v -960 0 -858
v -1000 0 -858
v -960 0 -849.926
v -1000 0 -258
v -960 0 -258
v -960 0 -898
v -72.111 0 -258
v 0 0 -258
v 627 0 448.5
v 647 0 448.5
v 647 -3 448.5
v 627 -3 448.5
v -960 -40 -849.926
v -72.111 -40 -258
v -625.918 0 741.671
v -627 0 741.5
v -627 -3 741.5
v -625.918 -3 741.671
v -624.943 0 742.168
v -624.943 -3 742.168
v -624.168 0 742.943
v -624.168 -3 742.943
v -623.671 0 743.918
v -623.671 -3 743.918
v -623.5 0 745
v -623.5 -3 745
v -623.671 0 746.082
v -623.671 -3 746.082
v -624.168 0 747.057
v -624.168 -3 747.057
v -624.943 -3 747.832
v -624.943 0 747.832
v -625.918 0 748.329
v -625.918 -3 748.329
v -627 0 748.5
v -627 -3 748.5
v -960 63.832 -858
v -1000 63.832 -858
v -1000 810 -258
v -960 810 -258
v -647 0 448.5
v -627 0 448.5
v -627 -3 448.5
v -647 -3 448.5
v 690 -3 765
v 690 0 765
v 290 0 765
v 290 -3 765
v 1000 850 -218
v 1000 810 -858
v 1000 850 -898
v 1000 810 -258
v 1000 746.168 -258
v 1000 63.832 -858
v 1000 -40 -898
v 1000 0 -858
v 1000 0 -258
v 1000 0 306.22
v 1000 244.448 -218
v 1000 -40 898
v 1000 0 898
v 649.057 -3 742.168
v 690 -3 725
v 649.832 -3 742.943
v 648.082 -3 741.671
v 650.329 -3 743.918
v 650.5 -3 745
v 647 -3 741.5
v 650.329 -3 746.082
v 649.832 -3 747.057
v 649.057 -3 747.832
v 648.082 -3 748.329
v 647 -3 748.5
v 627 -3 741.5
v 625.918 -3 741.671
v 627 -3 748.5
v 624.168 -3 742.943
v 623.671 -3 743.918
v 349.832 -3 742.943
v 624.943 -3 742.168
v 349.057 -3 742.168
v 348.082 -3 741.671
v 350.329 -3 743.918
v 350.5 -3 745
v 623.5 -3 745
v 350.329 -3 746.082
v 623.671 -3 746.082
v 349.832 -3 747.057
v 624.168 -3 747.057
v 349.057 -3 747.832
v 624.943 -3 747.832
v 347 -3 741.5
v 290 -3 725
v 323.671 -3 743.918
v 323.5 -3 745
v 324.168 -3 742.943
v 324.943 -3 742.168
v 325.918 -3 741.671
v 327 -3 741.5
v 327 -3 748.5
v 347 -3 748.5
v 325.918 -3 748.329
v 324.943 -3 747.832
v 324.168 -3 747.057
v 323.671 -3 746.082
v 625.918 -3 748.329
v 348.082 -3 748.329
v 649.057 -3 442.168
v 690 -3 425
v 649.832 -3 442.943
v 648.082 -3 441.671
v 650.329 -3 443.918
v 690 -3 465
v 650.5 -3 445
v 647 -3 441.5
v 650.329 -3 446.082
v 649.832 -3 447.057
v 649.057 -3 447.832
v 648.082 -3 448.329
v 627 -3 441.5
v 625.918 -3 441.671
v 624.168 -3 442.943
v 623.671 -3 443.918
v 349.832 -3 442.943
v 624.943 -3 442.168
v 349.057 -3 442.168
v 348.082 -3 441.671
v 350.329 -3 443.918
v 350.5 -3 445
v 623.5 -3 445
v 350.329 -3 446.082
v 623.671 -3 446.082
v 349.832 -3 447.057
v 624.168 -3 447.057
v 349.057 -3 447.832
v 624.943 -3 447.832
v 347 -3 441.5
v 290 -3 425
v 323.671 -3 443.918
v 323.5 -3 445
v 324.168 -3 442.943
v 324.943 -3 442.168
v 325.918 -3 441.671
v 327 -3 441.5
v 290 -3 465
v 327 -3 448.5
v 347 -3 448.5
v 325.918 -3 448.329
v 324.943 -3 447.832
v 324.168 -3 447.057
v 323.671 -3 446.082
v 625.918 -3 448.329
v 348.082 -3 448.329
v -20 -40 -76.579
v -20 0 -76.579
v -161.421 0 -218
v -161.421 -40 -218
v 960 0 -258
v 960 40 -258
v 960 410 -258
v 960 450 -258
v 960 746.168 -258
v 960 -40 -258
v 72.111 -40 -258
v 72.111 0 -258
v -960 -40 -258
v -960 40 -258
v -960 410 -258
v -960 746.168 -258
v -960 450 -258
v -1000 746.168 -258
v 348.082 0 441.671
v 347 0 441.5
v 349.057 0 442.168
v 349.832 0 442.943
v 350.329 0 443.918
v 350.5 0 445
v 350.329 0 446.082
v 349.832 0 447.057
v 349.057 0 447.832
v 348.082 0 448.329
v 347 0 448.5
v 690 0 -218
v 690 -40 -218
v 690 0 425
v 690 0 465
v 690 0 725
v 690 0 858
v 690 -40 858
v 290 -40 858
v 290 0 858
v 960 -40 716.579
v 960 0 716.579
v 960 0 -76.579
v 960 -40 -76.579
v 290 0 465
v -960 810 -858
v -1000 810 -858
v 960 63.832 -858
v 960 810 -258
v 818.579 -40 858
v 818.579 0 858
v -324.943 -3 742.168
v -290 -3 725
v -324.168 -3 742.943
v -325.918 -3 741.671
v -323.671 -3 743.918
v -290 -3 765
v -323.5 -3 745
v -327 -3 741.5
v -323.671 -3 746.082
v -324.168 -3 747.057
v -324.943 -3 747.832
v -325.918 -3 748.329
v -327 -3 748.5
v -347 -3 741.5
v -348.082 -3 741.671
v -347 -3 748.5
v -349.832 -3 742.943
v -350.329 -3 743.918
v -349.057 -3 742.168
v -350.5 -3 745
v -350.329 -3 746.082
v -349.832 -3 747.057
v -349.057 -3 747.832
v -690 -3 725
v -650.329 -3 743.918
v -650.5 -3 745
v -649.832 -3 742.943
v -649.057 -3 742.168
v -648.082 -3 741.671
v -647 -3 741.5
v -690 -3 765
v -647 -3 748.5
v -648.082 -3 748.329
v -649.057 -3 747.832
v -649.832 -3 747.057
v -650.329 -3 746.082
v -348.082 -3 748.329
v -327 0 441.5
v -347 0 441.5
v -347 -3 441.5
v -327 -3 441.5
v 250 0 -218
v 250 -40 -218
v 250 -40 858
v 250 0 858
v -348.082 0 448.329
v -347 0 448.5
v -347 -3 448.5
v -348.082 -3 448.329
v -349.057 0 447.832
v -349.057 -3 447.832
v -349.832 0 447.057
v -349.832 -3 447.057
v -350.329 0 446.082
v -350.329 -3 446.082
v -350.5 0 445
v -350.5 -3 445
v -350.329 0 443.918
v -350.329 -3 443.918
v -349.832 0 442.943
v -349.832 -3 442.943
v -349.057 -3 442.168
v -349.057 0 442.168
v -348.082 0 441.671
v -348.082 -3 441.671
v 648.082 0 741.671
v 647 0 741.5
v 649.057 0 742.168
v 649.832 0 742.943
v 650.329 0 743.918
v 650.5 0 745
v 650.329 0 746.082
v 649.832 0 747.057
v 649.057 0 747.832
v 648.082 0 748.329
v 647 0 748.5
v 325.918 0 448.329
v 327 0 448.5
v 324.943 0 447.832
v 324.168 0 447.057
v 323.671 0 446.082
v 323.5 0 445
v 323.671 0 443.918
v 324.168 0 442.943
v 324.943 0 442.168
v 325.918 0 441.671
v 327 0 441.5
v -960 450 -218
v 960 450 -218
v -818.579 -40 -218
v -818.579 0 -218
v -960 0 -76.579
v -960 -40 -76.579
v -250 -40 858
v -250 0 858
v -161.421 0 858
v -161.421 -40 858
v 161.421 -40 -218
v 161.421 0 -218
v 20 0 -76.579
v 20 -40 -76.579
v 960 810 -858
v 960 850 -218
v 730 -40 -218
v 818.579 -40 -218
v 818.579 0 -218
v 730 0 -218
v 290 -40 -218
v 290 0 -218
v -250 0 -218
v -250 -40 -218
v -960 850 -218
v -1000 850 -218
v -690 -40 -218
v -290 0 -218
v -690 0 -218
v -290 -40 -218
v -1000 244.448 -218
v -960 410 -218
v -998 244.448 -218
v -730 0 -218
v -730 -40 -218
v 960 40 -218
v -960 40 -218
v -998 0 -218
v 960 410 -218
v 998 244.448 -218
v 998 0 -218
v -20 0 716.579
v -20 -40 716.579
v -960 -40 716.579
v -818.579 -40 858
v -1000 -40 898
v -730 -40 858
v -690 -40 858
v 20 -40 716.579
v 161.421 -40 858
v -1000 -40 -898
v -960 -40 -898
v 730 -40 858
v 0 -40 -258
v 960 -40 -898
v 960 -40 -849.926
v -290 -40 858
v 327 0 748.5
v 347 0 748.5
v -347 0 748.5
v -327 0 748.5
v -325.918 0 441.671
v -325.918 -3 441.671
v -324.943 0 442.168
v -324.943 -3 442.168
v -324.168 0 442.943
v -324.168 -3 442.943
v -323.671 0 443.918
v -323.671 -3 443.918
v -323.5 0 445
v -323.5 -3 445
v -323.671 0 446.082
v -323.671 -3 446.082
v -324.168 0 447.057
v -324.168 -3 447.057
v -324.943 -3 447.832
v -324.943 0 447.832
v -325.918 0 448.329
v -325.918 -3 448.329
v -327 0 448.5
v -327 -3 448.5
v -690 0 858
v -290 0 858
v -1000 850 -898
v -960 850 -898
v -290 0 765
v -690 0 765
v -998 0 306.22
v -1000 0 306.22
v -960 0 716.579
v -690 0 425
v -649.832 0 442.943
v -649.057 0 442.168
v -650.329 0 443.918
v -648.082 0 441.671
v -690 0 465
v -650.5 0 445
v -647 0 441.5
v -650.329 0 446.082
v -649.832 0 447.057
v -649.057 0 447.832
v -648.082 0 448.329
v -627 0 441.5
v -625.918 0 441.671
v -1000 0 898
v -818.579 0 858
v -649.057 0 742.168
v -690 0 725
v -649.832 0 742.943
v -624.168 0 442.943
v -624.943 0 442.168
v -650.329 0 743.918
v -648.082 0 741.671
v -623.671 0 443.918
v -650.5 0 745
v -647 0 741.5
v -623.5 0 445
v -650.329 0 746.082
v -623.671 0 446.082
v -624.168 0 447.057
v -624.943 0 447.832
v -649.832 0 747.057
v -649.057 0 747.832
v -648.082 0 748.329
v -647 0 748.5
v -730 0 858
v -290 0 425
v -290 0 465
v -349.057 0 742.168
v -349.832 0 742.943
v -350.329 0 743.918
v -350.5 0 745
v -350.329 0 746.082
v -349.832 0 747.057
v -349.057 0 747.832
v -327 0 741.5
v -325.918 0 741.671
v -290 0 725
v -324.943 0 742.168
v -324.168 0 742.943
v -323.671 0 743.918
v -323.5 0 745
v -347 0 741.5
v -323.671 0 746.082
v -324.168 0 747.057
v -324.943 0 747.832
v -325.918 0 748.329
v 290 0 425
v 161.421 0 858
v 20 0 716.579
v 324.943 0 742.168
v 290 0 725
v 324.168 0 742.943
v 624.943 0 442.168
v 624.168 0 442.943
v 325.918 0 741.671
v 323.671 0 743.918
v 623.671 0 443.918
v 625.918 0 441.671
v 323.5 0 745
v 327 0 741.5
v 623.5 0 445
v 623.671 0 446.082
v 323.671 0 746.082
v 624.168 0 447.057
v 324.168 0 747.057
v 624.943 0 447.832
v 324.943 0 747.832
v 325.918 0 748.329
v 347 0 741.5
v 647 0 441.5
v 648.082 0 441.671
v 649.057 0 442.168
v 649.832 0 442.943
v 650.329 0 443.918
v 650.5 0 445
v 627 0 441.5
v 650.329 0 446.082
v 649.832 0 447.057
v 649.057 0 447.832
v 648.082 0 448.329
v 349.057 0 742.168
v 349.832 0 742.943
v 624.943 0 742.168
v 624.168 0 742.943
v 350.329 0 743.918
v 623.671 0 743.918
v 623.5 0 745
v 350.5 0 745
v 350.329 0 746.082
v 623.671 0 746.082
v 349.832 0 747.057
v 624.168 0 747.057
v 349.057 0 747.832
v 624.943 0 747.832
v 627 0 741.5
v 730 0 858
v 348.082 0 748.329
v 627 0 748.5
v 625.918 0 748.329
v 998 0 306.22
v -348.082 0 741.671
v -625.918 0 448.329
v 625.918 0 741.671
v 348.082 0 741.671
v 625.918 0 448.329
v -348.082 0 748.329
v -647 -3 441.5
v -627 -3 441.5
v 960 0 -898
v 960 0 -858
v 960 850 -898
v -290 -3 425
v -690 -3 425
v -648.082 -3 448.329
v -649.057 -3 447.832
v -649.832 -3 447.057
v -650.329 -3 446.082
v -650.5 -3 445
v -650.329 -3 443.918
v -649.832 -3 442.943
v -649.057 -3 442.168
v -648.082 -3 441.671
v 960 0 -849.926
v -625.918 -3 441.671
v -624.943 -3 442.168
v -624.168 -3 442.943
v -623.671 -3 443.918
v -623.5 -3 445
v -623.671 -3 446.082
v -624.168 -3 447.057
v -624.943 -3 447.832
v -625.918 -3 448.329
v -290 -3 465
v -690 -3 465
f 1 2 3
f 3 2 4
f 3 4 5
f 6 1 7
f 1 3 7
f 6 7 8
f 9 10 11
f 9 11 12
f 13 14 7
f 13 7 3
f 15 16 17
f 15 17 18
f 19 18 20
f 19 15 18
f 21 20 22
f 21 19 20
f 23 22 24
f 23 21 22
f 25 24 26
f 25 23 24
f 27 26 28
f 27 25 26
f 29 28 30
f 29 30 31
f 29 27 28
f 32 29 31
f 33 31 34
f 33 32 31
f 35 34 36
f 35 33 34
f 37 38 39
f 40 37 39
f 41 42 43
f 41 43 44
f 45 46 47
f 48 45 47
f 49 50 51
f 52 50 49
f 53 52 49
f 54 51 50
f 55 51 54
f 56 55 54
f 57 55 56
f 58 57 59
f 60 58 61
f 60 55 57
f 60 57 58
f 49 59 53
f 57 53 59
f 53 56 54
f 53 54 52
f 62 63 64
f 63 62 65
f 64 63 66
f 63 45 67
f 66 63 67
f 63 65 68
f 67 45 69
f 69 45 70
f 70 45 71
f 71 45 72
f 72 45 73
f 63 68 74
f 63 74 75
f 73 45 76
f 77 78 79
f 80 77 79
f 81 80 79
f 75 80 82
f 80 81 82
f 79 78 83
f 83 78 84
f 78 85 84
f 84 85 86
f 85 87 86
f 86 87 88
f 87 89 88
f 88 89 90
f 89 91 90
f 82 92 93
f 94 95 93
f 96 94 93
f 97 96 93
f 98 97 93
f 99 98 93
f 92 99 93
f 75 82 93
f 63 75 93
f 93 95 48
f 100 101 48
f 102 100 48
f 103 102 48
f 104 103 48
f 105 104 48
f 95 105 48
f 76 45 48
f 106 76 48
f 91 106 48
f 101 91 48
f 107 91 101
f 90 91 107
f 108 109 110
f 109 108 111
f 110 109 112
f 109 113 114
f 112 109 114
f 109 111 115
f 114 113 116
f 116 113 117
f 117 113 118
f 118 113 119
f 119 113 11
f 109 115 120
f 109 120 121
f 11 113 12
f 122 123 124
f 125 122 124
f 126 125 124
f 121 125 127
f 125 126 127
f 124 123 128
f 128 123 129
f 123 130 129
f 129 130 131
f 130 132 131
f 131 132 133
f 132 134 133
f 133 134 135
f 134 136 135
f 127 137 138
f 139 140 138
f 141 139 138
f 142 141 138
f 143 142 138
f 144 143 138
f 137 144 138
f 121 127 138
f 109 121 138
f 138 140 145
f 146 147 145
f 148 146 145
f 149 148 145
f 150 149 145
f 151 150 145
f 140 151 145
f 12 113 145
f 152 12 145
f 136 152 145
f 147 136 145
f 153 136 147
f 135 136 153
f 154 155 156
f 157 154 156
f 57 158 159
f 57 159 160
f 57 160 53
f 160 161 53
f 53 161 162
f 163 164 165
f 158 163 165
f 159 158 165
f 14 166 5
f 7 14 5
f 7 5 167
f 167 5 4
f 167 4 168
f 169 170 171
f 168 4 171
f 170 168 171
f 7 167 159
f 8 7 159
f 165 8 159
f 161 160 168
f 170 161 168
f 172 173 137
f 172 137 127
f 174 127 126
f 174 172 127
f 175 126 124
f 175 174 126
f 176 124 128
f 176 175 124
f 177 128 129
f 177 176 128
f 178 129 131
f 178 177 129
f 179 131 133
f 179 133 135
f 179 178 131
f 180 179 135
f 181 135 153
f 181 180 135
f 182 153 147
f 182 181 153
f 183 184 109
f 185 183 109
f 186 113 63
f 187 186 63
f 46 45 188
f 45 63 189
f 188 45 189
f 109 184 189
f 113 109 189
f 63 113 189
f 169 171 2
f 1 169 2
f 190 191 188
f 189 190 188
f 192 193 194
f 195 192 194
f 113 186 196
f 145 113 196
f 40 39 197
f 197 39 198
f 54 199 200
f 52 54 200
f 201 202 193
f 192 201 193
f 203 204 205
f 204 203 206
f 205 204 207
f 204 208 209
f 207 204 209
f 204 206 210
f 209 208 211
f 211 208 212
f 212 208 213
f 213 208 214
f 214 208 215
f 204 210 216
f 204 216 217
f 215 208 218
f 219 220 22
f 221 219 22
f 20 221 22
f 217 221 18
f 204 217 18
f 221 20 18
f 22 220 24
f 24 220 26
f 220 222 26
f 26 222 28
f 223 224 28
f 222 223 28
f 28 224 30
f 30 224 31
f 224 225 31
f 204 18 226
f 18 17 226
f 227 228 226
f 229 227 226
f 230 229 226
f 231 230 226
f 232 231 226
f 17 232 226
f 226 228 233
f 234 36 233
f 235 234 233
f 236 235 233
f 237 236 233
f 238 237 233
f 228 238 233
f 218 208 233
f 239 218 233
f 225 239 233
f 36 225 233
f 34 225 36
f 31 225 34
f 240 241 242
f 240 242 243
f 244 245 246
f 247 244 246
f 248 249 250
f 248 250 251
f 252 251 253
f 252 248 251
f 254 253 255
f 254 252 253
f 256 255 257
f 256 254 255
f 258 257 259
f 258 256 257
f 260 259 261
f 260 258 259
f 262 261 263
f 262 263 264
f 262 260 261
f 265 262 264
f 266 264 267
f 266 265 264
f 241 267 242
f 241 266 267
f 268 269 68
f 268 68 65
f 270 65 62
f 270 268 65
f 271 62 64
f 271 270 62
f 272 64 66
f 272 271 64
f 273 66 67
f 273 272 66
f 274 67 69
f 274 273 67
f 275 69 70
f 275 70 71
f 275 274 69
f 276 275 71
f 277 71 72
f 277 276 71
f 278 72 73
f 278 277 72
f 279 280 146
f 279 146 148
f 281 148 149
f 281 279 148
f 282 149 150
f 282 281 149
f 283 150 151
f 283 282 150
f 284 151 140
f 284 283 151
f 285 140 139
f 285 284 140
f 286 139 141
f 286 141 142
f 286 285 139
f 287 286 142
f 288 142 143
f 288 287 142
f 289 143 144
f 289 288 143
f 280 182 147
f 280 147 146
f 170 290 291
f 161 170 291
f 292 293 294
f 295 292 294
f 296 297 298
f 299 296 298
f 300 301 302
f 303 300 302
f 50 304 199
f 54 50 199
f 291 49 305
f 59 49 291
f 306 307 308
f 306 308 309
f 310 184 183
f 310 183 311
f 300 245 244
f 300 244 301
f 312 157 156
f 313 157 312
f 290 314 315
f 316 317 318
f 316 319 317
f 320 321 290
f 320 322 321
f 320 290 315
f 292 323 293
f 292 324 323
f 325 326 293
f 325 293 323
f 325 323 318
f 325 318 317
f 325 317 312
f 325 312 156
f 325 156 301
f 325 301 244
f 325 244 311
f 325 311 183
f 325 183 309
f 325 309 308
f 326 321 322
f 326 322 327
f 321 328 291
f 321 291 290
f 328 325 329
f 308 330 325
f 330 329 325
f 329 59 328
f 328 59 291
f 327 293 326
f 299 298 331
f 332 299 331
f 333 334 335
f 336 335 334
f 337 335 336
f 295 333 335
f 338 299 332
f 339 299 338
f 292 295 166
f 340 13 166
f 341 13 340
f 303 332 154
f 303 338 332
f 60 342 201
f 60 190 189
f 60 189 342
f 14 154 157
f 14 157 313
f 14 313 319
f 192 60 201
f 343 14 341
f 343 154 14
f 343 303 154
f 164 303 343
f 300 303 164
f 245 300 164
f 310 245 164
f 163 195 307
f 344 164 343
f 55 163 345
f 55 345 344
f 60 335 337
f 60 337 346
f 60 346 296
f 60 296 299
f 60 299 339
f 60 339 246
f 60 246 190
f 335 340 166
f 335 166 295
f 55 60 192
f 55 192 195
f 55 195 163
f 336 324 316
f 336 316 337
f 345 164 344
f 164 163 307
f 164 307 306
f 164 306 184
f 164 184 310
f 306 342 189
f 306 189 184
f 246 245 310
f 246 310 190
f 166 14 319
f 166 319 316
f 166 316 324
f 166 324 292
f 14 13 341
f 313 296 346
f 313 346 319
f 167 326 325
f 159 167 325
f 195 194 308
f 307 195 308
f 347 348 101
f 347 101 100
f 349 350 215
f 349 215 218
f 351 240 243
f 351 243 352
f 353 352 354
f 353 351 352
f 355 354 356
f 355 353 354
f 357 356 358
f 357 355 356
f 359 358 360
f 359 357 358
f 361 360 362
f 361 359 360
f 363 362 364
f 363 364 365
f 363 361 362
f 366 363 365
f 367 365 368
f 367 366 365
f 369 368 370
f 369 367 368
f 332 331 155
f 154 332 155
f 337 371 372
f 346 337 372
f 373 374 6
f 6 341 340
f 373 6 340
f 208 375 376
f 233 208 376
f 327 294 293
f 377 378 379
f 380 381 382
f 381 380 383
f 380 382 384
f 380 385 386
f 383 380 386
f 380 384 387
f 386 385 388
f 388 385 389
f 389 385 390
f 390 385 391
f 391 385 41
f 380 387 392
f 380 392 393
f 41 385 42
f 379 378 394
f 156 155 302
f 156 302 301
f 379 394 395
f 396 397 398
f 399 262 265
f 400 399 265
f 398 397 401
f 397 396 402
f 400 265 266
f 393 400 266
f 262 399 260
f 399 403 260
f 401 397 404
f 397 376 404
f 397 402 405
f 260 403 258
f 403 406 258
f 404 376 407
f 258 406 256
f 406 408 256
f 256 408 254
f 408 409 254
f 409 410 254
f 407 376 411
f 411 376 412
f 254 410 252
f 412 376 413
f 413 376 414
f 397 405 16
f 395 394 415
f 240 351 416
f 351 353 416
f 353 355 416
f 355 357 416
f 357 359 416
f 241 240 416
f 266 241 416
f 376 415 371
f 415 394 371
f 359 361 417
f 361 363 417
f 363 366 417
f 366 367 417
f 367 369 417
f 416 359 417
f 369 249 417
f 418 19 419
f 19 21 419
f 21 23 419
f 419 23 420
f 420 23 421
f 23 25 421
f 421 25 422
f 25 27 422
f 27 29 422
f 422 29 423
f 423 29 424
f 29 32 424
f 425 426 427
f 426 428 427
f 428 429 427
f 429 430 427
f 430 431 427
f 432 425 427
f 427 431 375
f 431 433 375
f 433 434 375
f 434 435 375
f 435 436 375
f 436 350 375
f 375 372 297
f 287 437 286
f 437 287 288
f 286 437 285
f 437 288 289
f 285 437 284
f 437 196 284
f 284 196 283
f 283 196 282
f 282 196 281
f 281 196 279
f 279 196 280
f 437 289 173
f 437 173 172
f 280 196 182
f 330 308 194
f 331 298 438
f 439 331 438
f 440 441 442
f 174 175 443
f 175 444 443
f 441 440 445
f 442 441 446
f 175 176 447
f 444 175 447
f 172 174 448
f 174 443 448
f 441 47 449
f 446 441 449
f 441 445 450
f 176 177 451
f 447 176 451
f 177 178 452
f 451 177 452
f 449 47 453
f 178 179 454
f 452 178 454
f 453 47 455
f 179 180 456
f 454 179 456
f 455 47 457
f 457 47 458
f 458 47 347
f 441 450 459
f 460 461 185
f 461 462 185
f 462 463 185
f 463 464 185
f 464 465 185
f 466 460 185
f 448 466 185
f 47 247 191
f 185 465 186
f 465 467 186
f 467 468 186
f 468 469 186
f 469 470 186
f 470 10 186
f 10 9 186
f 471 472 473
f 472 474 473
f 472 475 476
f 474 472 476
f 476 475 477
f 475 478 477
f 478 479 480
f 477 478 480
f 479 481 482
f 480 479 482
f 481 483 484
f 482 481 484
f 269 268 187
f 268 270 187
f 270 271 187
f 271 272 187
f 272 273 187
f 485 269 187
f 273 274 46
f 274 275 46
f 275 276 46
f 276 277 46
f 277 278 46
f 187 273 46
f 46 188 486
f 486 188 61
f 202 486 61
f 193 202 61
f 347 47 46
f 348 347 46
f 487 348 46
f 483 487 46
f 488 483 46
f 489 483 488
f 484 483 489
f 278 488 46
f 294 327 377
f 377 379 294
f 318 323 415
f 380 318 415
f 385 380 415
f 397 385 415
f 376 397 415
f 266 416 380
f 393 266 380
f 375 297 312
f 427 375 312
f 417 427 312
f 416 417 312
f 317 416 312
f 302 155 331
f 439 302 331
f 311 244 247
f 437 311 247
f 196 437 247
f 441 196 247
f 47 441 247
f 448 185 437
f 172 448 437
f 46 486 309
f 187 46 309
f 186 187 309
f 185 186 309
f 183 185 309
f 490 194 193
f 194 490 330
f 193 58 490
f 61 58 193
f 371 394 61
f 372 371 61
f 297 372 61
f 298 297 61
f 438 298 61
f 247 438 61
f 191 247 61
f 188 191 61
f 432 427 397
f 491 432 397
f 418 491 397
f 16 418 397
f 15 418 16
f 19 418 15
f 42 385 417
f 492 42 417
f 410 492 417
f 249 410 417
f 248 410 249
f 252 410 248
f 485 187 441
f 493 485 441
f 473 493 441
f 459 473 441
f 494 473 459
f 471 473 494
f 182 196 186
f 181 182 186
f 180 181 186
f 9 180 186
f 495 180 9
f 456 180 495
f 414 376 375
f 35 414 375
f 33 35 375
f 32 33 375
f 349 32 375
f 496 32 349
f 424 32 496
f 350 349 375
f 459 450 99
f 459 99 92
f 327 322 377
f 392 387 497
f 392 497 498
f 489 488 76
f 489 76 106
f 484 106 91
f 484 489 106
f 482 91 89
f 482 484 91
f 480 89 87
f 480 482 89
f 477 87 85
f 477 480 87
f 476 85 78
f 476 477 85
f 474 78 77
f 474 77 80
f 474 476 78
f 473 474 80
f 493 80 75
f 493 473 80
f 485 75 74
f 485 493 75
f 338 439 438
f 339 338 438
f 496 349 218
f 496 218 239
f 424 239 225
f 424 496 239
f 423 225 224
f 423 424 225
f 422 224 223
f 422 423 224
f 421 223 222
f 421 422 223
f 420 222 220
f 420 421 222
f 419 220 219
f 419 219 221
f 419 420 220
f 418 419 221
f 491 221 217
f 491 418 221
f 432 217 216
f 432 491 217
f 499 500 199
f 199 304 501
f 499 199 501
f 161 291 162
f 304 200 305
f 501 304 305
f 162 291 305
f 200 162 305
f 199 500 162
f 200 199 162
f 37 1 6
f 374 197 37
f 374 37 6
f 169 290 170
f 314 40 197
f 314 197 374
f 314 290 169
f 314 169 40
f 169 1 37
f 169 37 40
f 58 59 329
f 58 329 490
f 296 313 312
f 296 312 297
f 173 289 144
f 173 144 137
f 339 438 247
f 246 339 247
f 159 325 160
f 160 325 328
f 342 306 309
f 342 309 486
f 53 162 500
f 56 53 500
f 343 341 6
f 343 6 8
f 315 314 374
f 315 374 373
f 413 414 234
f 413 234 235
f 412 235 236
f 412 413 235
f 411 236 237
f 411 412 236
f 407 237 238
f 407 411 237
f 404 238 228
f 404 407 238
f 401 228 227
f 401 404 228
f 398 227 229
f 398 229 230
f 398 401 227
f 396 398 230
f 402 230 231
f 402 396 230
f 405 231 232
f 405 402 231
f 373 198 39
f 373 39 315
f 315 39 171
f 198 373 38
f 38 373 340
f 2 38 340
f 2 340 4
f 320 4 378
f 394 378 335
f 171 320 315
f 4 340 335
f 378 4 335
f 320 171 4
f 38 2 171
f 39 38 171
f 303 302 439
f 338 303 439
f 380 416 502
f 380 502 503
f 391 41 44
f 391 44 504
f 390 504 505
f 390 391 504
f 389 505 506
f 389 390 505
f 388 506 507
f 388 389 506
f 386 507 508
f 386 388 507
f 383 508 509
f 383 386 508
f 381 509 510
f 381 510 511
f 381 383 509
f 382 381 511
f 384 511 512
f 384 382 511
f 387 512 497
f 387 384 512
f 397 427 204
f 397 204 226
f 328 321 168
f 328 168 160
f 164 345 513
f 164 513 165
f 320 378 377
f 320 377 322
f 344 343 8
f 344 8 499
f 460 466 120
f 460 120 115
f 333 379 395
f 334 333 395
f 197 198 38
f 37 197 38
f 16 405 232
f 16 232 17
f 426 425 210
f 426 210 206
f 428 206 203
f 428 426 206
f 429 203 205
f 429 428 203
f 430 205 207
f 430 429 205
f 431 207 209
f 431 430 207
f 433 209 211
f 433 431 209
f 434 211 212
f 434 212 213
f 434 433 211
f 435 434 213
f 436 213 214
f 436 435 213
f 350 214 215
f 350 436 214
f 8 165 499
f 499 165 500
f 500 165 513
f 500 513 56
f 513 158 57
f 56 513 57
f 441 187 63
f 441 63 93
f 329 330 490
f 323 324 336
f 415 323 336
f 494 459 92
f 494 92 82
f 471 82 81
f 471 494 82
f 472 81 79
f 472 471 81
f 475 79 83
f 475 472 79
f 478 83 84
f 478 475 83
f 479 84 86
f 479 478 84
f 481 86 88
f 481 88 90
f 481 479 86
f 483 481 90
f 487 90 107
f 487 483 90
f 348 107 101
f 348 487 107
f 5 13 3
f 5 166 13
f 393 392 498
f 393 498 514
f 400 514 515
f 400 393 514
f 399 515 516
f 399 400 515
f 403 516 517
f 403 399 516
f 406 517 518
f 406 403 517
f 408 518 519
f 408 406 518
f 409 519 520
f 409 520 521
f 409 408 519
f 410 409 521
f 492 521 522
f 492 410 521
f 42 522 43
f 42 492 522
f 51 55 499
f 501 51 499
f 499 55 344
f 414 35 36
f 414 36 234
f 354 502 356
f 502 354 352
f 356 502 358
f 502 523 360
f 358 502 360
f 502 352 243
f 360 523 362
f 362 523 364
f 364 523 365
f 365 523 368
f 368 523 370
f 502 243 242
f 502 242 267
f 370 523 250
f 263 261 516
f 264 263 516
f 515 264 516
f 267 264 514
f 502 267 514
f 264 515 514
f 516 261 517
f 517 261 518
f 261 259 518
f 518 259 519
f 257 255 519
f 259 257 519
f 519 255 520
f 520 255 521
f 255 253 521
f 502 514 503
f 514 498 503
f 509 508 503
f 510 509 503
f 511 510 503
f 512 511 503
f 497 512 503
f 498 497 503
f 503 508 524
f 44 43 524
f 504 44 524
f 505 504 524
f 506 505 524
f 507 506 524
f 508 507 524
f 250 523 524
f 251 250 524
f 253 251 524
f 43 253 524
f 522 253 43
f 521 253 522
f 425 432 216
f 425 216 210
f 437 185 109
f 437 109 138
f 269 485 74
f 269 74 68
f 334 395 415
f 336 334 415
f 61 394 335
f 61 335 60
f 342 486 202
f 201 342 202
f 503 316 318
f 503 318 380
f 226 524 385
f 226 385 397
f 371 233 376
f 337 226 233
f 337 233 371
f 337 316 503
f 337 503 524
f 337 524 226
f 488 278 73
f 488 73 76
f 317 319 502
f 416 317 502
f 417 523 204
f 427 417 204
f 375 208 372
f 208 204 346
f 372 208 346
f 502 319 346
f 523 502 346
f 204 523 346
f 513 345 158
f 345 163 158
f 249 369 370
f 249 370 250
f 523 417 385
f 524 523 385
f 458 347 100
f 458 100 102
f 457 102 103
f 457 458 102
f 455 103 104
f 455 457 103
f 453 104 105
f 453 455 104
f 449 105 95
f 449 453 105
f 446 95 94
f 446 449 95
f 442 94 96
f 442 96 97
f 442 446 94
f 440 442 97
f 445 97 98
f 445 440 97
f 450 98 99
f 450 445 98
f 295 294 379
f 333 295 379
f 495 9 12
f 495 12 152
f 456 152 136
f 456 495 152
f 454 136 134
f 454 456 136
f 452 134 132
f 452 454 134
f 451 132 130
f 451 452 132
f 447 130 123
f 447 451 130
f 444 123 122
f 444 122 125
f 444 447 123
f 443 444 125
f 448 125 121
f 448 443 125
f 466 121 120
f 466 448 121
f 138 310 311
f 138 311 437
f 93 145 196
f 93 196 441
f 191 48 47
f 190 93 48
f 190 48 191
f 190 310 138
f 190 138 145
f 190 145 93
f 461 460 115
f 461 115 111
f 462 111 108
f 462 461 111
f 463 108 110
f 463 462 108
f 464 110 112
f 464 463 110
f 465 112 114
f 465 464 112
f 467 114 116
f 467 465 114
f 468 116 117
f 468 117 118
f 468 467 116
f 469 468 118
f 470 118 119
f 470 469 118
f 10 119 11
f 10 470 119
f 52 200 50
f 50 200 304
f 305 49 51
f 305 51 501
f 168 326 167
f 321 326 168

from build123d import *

# Parameters (mm, degrees)
F0_W          = 2000
F0_H          = 1796
F1_DEPTH      = 40
F2_W          = 2000
F2_H          = 680
F3_DEPTH      = 850
F4_W          = 1920
F4_H          = 640
F5_DEPTH      = 40.001
F5_DEPTH_BACK = 850.001
F7_DEPTH      = 2000.001
F8_W          = 1920
F8_H          = 400
F8_H_2        = 370
F9_DEPTH      = 680.001
F11_DEPTH     = 40
F12_W         = 40
F12_H         = 1076
F13_DEPTH     = 40
F14_W         = 400
F14_H         = 40
F15_DEPTH     = 3
F17_DEPTH     = 2
F19_DEPTH     = 2


with BuildPart() as f1:
    # F0 (on Front) → F1 (new body)
    with BuildSketch(Plane.XZ):
        Rectangle(F0_W, F0_H)
    extrude(amount=F1_DEPTH)

    # F2 (on face) → F3 (join)
    with BuildSketch(Plane(origin=(0, 0, 0), x_dir=(-1, 0, 0), z_dir=(0, 1, 0))):
        with Locations((0, -558)):
            Rectangle(F2_W, F2_H)
    extrude(amount=F3_DEPTH)

    # F4 (on face) → F5 (cut, two sides)
    with BuildSketch(Plane(origin=(0, 0, 0), x_dir=(-1, 0, 0), z_dir=(0, 1, 0))) as f5_sk:
        with Locations((0, -578)):
            Rectangle(F4_W, F4_H)
        Polygon((-161.4213562373, -218), (-20, -76.5786437627), (-20, 716.5786437627), (-161.4213562373, 858), (-818.5786437627, 858), (-960, 716.5786437627), (-960, -76.5786437627), (-818.5786437627, -218), align=None)
        Polygon((20, 716.5786437627), (20, -76.5786437627), (161.4213562373, -218), (818.5786437627, -218), (960, -76.5786437627), (960, 716.5786437627), (818.5786437627, 858), (161.4213562373, 858), align=None)
    extrude(amount=-F5_DEPTH, mode=Mode.SUBTRACT)
    extrude(f5_sk.sketch, amount=F5_DEPTH_BACK, mode=Mode.SUBTRACT)

    # F6 (on face) → F7 (cut, through all)
    with BuildSketch(Plane(origin=(-1000, 0, 0), x_dir=(0, -1, 0), z_dir=(-1, 0, 0))):
        Polygon((-63.8319580969, -858), (-810, -258), (-810, -858), align=None)
        Polygon((0, -858), (0, -258), (-746.1680419031, -258), align=None)
    extrude(amount=-F7_DEPTH, mode=Mode.SUBTRACT)

    # F8 (on face) → F9 (cut, through all)
    with BuildSketch(Plane.XY.offset(-218)):
        with Locations((0, 650)):
            Rectangle(F8_W, F8_H)
        with Locations((0, 225)):
            Rectangle(F8_W, F8_H_2)
    extrude(amount=-F9_DEPTH, mode=Mode.SUBTRACT)

    # F10 (on face) → F11 (join)
    with BuildSketch(Plane.XZ.offset(40)):
        Polygon((72.1110255093, -258), (0, -258), (960, -898), (960, -849.9259829938), align=None)
        Polygon((-960, -898), (0, -258), (-72.1110255093, -258), (-960, -849.9259829938), align=None)
    extrude(amount=-F11_DEPTH)

    # F12 (on face) → F13 (join)
    with BuildSketch(Plane.XZ.offset(40)):
        with Locations((-710, 320)):
            Rectangle(F12_W, F12_H)
        with Locations((-270, 320)):
            Rectangle(F12_W, F12_H)
        with Locations((270, 320)):
            Rectangle(F12_W, F12_H)
        with Locations((710, 320)):
            Rectangle(F12_W, F12_H)
    extrude(amount=-F13_DEPTH)

    # F14 (on face) → F15 (join)
    with BuildSketch(Plane(origin=(0, 0, 0), x_dir=(-1, 0, 0), z_dir=(0, 1, 0))):
        with Locations((490, 745)):
            Rectangle(F14_W, F14_H)
        with BuildLine():
            Line((327, 748.5), (337, 748.5))
            Line((337, 748.5), (347, 748.5))
            ThreePointArc((347, 748.5), (350.5, 745), (347, 741.5))
            Line((347, 741.5), (337, 741.5))
            Line((337, 741.5), (327, 741.5))
            ThreePointArc((327, 741.5), (323.5, 745), (327, 748.5))
        make_face(mode=Mode.SUBTRACT)
        with BuildLine():
            Line((627, 748.5), (637, 748.5))
            Line((637, 748.5), (647, 748.5))
            ThreePointArc((647, 748.5), (650.5, 745), (647, 741.5))
            Line((647, 741.5), (637, 741.5))
            Line((637, 741.5), (627, 741.5))
            ThreePointArc((627, 741.5), (623.5, 745), (627, 748.5))
        make_face(mode=Mode.SUBTRACT)
        with Locations((490, 445)):
            Rectangle(F14_W, F14_H)
        with BuildLine():
            Line((327, 448.5), (337, 448.5))
            Line((337, 448.5), (347, 448.5))
            ThreePointArc((347, 448.5), (350.5, 445), (347, 441.5))
            Line((347, 441.5), (337, 441.5))
            Line((337, 441.5), (327, 441.5))
            ThreePointArc((327, 441.5), (323.5, 445), (327, 448.5))
        make_face(mode=Mode.SUBTRACT)
        with BuildLine():
            Line((627, 448.5), (637, 448.5))
            Line((637, 448.5), (647, 448.5))
            ThreePointArc((647, 448.5), (650.5, 445), (647, 441.5))
            Line((647, 441.5), (637, 441.5))
            Line((637, 441.5), (627, 441.5))
            ThreePointArc((627, 441.5), (623.5, 445), (627, 448.5))
        make_face(mode=Mode.SUBTRACT)
        with Locations((-490, 745)):
            Rectangle(F14_W, F14_H)
        with BuildLine():
            Line((-647, 748.5), (-637, 748.5))
            Line((-637, 748.5), (-627, 748.5))
            ThreePointArc((-627, 748.5), (-623.5, 745), (-627, 741.5))
            Line((-627, 741.5), (-637, 741.5))
            Line((-637, 741.5), (-647, 741.5))
            ThreePointArc((-647, 741.5), (-650.5, 745), (-647, 748.5))
        make_face(mode=Mode.SUBTRACT)
        with BuildLine():
            Line((-347, 748.5), (-337, 748.5))
            Line((-337, 748.5), (-327, 748.5))
            ThreePointArc((-327, 748.5), (-323.5, 745), (-327, 741.5))
            Line((-327, 741.5), (-337, 741.5))
            Line((-337, 741.5), (-347, 741.5))
            ThreePointArc((-347, 741.5), (-350.5, 745), (-347, 748.5))
        make_face(mode=Mode.SUBTRACT)
        with Locations((-490, 445)):
            Rectangle(F14_W, F14_H)
        with BuildLine():
            Line((-647, 448.5), (-637, 448.5))
            Line((-637, 448.5), (-627, 448.5))
            ThreePointArc((-627, 448.5), (-623.5, 445), (-627, 441.5))
            Line((-627, 441.5), (-637, 441.5))
            Line((-637, 441.5), (-647, 441.5))
            ThreePointArc((-647, 441.5), (-650.5, 445), (-647, 448.5))
        make_face(mode=Mode.SUBTRACT)
        with BuildLine():
            Line((-347, 448.5), (-337, 448.5))
            Line((-337, 448.5), (-327, 448.5))
            ThreePointArc((-327, 448.5), (-323.5, 445), (-327, 441.5))
            Line((-327, 441.5), (-337, 441.5))
            Line((-337, 441.5), (-347, 441.5))
            ThreePointArc((-347, 441.5), (-350.5, 445), (-347, 448.5))
        make_face(mode=Mode.SUBTRACT)
    extrude(amount=-F15_DEPTH)

    # F16 (on face) → F17 (join)
    with BuildSketch(Plane(origin=(-1000, 0, 0), x_dir=(0, -1, 0), z_dir=(-1, 0, 0))):
        Polygon((40, 392), (-263.0999778007, -258), (40, -258), align=None)
    extrude(amount=-F17_DEPTH)

    # F18 (on face) → F19 (join)
    with BuildSketch(Plane.YZ.offset(1000)):
        Polygon((-40, -258), (263.0999778007, -258), (-40, 392), align=None)
    extrude(amount=-F19_DEPTH)


solid = f1.part
